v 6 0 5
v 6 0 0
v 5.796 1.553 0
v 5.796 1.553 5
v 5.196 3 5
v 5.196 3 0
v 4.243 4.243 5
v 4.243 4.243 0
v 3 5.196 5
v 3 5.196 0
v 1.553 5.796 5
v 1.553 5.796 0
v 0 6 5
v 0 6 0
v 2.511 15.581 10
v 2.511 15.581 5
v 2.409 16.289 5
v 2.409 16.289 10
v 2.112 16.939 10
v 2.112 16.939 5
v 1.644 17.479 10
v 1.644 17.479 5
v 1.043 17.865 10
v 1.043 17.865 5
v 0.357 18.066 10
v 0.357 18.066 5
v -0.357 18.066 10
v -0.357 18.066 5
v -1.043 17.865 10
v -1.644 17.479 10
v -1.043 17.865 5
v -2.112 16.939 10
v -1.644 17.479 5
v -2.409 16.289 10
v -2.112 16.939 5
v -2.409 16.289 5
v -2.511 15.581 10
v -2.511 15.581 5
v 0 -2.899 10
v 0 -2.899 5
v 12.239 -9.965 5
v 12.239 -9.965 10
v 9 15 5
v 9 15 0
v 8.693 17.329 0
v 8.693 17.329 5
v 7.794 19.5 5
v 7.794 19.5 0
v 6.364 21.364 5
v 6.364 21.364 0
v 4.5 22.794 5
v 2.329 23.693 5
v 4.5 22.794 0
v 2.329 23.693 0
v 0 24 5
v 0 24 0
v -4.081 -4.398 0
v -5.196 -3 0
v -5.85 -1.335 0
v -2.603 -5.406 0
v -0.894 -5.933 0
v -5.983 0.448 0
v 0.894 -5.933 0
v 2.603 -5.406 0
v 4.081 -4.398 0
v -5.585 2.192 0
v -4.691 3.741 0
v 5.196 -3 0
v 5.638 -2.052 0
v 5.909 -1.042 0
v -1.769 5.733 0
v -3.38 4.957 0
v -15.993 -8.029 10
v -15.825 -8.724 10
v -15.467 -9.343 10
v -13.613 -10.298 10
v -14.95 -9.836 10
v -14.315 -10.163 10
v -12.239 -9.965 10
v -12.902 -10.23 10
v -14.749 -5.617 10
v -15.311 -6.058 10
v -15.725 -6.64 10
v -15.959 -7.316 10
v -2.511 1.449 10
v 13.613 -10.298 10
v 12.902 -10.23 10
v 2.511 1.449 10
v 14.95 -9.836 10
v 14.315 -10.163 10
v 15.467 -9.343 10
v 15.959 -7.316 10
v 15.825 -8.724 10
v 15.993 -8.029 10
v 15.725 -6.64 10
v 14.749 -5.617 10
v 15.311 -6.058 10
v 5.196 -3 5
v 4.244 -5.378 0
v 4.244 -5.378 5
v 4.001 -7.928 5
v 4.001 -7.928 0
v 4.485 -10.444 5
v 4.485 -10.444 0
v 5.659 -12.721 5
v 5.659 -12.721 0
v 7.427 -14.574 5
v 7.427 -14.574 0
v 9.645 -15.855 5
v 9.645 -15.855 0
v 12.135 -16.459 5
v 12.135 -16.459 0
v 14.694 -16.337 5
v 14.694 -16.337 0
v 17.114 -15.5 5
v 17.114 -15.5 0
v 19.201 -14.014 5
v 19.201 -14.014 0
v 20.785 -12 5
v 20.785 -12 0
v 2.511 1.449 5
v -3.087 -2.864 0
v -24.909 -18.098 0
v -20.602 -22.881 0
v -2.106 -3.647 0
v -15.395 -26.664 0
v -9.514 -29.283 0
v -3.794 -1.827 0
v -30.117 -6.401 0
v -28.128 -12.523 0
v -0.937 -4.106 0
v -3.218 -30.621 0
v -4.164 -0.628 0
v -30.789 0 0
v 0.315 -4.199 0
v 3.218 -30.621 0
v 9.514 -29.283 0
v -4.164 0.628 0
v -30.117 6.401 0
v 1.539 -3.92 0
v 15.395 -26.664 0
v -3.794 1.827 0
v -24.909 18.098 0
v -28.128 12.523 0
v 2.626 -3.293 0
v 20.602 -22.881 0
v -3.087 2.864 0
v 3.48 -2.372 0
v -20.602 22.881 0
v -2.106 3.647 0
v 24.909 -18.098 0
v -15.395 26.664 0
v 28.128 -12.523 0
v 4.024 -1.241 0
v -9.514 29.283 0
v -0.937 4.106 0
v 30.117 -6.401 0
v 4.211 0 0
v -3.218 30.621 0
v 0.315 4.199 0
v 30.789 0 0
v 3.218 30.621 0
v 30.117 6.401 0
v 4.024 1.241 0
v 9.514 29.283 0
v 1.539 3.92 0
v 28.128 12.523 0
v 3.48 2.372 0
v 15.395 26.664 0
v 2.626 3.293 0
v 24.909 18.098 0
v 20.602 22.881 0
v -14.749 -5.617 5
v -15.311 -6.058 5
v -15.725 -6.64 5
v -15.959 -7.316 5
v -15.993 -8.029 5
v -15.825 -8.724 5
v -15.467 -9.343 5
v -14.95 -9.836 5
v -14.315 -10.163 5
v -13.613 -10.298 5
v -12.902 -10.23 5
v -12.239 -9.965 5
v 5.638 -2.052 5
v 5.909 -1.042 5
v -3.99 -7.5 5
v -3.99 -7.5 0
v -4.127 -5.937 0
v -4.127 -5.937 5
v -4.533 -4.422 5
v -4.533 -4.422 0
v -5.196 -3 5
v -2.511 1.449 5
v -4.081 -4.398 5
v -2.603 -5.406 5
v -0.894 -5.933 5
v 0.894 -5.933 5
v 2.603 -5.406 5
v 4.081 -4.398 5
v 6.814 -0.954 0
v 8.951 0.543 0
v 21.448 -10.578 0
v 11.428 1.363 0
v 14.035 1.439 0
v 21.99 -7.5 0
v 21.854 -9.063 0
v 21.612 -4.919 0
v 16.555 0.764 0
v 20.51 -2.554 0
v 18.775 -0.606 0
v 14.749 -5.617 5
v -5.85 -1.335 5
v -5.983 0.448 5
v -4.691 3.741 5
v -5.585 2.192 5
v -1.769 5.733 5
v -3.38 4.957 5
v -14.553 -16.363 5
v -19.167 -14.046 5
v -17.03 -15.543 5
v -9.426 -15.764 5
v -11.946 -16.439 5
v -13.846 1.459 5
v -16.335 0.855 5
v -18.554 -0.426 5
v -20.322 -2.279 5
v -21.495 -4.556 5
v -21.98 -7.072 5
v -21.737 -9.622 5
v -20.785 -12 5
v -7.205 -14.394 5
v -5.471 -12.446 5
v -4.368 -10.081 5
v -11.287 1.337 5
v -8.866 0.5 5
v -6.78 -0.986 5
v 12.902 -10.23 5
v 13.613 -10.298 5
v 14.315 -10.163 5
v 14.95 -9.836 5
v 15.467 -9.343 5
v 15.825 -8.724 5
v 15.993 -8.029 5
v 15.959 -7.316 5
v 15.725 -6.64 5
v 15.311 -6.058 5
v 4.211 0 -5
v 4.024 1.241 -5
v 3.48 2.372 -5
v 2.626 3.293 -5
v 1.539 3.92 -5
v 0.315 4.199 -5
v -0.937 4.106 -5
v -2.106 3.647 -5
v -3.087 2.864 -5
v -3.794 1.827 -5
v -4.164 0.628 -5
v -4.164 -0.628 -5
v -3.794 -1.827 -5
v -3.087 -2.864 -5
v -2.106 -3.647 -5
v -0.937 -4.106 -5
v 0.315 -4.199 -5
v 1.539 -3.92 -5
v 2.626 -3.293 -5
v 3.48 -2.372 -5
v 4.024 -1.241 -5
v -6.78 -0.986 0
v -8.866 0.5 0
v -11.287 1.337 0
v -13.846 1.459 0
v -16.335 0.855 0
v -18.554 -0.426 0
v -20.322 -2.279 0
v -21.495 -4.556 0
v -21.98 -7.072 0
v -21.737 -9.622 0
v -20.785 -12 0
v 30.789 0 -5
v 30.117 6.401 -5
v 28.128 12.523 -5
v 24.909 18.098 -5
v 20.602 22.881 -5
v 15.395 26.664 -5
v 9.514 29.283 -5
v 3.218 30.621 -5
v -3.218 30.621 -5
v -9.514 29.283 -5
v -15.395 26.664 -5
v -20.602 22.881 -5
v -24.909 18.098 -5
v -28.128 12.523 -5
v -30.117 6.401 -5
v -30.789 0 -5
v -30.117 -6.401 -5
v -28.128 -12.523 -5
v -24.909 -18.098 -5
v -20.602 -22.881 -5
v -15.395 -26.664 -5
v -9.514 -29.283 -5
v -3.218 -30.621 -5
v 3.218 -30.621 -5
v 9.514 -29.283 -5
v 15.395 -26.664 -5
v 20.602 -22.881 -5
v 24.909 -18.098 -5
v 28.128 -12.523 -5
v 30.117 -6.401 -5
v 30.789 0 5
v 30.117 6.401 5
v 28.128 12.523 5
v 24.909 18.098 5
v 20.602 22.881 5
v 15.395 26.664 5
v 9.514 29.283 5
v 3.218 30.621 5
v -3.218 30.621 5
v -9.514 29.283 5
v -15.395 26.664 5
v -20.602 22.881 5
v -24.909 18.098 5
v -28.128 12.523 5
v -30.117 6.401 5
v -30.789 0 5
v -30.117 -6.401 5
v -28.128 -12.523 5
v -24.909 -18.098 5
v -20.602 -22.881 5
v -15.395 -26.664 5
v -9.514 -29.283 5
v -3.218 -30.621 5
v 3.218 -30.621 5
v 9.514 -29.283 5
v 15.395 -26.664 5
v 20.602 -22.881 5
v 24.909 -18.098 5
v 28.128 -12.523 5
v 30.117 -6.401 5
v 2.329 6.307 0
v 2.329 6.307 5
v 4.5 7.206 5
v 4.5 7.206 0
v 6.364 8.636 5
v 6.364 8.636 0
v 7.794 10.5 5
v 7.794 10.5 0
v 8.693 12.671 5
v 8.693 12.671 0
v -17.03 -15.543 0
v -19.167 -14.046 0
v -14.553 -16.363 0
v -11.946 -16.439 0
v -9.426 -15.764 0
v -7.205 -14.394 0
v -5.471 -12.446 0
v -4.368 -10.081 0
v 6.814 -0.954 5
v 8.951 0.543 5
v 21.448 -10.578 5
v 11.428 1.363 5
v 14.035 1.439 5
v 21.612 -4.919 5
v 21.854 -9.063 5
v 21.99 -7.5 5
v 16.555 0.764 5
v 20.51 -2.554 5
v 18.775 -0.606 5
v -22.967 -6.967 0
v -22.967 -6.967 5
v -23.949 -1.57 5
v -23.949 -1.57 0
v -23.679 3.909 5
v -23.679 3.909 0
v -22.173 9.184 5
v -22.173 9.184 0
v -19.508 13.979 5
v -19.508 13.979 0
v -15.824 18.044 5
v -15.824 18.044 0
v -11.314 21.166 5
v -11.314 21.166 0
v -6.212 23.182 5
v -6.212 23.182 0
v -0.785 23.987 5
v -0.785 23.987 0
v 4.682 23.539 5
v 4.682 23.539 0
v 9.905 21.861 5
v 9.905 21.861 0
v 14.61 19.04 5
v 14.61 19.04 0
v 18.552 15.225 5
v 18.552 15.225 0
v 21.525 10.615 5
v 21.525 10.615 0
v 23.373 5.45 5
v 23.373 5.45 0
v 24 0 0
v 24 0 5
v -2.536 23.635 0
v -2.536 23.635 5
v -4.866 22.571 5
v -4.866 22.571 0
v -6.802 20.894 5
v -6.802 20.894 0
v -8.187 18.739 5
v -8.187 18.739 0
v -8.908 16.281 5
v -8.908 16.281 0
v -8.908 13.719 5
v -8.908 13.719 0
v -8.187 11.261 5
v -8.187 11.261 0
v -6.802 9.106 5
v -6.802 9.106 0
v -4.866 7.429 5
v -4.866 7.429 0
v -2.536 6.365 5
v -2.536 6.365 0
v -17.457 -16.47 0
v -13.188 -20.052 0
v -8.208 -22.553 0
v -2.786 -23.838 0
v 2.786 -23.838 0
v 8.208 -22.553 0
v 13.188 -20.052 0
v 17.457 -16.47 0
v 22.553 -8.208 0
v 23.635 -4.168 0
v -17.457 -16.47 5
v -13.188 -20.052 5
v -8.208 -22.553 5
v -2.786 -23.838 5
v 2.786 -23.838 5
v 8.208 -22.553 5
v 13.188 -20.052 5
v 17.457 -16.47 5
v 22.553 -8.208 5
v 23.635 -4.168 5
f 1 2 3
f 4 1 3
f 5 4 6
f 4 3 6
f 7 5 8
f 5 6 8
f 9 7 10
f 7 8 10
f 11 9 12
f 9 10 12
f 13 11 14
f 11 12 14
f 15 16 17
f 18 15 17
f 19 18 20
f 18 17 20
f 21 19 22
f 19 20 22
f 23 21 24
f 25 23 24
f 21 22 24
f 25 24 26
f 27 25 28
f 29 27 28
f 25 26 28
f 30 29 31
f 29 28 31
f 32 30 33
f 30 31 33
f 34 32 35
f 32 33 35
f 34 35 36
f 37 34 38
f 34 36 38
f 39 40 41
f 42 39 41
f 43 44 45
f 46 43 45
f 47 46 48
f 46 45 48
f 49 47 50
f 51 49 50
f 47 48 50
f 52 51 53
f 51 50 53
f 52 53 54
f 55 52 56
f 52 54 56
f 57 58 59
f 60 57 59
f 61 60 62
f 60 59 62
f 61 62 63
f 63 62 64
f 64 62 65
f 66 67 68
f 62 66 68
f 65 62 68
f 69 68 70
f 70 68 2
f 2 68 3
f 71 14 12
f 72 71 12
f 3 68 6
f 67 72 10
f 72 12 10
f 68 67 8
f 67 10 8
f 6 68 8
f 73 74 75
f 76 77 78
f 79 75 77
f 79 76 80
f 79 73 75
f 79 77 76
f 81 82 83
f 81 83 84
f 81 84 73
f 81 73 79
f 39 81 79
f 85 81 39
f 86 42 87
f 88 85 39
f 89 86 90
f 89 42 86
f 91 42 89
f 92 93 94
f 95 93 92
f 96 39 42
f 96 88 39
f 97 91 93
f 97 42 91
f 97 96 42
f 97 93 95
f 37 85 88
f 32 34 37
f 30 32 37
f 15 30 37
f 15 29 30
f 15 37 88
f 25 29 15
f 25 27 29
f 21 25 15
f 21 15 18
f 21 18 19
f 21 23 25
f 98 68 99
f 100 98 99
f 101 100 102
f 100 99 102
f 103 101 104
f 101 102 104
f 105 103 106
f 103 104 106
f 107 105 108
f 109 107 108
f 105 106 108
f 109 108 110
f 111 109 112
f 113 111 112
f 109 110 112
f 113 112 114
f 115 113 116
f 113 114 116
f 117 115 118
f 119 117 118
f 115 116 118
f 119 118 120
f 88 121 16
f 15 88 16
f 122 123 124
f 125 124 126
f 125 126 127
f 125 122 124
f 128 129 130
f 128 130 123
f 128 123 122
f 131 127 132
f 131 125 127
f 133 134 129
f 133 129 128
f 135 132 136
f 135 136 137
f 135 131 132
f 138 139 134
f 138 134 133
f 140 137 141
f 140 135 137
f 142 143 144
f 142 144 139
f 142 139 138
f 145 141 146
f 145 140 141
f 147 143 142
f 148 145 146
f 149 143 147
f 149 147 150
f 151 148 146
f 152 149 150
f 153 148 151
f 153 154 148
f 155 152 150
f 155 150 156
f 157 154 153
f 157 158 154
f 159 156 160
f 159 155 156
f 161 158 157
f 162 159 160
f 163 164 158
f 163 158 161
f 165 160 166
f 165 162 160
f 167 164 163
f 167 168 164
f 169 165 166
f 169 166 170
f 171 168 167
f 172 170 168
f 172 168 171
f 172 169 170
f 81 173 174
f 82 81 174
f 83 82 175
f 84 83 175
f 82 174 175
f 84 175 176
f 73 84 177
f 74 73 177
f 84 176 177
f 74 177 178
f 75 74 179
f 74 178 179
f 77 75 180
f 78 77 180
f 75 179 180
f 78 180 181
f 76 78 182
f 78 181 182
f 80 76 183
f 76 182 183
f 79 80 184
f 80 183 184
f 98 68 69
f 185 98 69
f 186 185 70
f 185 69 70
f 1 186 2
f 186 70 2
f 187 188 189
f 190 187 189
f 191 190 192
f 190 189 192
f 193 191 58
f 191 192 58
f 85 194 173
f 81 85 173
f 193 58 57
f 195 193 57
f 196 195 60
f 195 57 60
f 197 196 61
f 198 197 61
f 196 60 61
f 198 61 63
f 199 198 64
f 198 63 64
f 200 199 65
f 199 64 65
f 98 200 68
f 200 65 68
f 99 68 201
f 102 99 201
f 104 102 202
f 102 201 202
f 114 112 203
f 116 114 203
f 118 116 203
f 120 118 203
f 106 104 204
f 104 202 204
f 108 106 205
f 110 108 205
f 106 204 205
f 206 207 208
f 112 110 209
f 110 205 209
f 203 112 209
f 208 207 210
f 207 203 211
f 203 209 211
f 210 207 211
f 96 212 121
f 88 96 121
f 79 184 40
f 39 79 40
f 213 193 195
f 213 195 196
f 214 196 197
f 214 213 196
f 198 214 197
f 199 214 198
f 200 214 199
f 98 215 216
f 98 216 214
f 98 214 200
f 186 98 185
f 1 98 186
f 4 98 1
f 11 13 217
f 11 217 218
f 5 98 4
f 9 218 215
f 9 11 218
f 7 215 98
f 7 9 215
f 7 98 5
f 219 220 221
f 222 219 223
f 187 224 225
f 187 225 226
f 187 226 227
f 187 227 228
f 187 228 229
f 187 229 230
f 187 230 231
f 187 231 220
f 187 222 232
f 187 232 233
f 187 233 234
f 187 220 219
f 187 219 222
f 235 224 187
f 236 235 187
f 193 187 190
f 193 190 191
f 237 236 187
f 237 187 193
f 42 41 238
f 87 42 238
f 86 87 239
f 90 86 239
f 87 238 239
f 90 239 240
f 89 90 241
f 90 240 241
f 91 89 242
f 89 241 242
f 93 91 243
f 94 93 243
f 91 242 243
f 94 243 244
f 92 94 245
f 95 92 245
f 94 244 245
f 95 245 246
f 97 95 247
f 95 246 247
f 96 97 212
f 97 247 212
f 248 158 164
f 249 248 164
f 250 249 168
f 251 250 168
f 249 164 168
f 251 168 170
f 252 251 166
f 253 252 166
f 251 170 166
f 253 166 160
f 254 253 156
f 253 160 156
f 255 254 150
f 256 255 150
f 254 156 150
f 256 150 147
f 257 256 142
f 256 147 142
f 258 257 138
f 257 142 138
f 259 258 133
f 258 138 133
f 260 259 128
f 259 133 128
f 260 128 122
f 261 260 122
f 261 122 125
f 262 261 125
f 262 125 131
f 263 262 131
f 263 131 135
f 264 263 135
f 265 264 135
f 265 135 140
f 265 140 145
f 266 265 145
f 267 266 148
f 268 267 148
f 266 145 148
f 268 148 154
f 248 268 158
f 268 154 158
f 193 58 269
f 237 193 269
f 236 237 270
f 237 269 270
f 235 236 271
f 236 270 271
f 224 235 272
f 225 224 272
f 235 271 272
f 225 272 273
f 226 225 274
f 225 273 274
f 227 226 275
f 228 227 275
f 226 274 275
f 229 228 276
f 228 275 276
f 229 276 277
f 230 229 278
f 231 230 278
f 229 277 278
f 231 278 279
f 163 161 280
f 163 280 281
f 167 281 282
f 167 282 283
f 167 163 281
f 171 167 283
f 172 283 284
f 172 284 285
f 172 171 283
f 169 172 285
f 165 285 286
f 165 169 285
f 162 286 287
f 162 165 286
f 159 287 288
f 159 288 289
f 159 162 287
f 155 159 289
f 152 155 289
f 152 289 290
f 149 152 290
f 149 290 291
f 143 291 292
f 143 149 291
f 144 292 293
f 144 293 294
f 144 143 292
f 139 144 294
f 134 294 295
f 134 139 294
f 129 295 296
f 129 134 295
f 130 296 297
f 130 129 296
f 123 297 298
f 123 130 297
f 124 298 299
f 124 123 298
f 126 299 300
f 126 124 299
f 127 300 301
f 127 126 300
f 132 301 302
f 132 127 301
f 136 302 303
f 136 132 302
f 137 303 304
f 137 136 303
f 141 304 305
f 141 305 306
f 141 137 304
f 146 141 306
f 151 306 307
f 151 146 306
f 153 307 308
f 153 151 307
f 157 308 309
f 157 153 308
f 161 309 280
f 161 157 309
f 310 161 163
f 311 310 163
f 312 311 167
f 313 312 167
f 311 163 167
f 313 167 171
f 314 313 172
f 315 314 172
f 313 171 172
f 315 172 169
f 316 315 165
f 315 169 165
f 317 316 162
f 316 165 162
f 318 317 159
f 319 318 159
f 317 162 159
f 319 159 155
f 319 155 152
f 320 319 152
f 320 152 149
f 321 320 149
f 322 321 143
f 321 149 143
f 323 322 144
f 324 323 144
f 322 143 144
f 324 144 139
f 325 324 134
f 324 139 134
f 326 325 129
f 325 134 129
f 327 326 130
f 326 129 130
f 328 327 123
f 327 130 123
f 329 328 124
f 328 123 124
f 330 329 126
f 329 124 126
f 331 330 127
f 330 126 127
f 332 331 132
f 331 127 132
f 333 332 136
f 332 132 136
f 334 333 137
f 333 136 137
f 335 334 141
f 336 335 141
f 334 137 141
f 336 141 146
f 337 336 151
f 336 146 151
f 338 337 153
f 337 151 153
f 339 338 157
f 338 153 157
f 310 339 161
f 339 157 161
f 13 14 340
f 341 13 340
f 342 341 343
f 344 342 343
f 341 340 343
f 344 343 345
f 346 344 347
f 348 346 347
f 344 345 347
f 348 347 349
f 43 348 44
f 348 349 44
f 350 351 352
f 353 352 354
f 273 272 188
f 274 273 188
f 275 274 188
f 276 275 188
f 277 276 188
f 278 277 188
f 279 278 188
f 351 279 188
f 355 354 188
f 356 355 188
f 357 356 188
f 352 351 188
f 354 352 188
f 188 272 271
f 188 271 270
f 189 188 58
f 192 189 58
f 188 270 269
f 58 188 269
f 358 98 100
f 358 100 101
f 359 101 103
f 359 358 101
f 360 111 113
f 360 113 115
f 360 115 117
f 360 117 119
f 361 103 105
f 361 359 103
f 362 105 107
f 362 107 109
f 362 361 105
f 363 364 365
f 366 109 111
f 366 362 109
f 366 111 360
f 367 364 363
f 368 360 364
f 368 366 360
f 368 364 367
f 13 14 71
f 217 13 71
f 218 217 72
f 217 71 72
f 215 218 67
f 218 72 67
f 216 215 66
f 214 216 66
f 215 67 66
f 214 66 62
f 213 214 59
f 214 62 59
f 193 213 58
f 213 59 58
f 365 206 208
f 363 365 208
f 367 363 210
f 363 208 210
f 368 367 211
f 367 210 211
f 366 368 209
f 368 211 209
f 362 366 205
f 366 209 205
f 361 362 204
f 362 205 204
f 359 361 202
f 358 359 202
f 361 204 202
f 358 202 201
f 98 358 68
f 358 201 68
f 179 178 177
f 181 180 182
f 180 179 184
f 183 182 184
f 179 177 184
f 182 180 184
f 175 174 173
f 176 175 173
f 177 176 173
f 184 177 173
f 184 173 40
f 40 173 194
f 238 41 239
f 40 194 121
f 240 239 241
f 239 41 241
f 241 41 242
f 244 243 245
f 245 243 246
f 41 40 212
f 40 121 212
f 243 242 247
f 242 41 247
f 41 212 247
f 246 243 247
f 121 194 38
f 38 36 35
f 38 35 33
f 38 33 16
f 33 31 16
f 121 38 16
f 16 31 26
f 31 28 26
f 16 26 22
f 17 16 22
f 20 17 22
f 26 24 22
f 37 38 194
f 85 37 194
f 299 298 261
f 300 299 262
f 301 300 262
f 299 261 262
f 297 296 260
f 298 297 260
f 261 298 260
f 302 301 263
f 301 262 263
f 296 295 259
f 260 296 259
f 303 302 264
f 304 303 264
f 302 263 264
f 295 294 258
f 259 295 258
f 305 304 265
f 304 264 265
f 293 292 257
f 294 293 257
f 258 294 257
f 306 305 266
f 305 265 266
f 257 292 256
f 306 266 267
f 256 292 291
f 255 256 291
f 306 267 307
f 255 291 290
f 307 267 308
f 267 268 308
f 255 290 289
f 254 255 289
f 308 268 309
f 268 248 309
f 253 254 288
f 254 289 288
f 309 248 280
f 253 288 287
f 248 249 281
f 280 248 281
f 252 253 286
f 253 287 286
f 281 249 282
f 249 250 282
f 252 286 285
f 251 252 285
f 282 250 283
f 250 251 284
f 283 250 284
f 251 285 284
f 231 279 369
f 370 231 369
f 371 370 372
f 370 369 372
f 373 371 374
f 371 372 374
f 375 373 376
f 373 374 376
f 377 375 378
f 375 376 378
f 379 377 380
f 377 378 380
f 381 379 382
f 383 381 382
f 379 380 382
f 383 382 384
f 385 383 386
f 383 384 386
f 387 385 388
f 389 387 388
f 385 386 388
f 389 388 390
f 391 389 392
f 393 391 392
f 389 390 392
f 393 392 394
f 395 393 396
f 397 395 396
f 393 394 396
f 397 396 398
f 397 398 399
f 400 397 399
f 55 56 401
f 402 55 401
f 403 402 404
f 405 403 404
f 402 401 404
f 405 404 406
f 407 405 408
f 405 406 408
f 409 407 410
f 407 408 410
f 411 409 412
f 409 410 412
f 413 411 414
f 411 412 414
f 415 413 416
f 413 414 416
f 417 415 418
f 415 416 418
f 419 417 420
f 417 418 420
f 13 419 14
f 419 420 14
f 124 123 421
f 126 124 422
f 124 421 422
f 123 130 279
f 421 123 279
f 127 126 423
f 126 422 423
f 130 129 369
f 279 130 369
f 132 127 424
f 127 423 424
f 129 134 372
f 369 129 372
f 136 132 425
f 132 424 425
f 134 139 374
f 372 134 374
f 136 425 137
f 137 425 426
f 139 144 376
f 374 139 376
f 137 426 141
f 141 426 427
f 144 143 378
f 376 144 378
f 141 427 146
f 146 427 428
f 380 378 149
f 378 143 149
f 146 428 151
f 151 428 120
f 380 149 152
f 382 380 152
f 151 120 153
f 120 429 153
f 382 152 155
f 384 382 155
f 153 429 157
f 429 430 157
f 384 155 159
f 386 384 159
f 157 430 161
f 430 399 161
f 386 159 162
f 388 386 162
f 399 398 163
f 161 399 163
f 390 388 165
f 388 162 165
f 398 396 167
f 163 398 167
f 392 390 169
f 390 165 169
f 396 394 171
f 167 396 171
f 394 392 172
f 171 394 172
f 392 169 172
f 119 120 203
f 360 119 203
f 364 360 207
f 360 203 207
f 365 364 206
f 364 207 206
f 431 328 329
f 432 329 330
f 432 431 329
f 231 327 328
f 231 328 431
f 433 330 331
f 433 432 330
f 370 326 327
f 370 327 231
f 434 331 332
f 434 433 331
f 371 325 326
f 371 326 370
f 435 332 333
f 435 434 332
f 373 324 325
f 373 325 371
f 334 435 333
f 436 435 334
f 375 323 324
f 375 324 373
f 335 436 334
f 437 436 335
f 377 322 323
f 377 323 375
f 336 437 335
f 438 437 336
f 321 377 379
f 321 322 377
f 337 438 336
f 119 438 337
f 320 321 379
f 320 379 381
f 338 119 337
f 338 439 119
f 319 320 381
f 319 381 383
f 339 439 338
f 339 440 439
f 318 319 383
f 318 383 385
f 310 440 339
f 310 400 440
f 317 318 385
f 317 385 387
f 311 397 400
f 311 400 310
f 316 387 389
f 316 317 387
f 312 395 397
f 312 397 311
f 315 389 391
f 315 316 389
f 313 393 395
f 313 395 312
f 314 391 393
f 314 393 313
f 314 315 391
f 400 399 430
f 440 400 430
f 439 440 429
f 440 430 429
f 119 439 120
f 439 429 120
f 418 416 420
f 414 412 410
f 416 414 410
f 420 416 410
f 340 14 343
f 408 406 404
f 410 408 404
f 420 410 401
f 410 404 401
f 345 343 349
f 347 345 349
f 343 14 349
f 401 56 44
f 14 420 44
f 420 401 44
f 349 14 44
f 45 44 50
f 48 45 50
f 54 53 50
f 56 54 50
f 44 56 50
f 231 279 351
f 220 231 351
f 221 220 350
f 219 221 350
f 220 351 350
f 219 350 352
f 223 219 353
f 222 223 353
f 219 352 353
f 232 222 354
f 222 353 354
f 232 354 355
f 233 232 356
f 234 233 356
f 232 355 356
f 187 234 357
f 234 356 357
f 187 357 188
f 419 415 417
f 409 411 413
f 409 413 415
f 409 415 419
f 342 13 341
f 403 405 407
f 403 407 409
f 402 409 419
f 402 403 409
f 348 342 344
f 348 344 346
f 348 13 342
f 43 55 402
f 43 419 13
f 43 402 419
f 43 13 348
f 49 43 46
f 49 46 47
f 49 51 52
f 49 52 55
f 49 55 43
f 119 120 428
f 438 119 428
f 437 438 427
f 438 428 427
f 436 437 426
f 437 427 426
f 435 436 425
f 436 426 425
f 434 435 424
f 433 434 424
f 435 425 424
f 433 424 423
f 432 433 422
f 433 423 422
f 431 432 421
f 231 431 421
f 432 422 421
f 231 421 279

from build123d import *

# Parameters (mm, degrees)
F1_DEPTH = 5
F0_R     = 30.7894498578
F3_DEPTH = 5
F4_R     = 30.7894498578
F4_R_2   = 4.2112716429
F5_DEPTH = 5


with BuildPart() as f1:
    # F0 (on Top) → F1 (new body)
    with BuildSketch(Plane.XY):
        with BuildLine():
            ThreePointArc((0, 24), (-9, 14.9999999913), (1.75e-08, 6))
            ThreePointArc((1.75e-08, 6), (6.3639610369, 8.6360389755), (9, 15))
            ThreePointArc((9, 15), (6.3639610307, 21.3639610307), (0, 24))
        make_face()
    extrude(amount=F1_DEPTH)


with BuildPart() as f1b:
    # F0 (on Top) → F1, piece 2 (new body)
    with BuildSketch(Plane.XY):
        with BuildLine():
            ThreePointArc((5.1961525106, -2.9999998477), (5.7955549805, -1.5529141857), (6, 0))
            ThreePointArc((6, 0), (4.2426406933, 4.2426406809), (1.75e-08, 6))
            ThreePointArc((1.75e-08, 6), (-5.1961524093, 3.0000000232), (-5.1961524408, -2.9999999687))
            ThreePointArc((-5.1961524408, -2.9999999687), (6.99e-08, -6), (5.1961525106, -2.9999998477))
        make_face()
    extrude(amount=F1_DEPTH)


with BuildPart() as f1c:
    # F0 (on Top) → F1, piece 3 (new body)
    with BuildSketch(Plane.XY):
        Circle(F0_R)
        with BuildLine():
            ThreePointArc((-20.7846098286, -11.9999997614), (-20.7846096219, 12.0000001193), (0, 24))
            ThreePointArc((0, 24), (16.9705627485, 16.9705627485), (24, 0))
            ThreePointArc((24, 0), (23.1822198145, -6.2116571438), (20.7846096273, -12.0000001101))
            ThreePointArc((20.7846096273, -12.0000001101), (-2.013e-07, -24), (-20.7846098286, -11.9999997614))
        make_face(mode=Mode.SUBTRACT)
    extrude(amount=F1_DEPTH)


with BuildPart() as f1d:
    # F0 (on Top) → F1, piece 4 (new body)
    with BuildSketch(Plane.XY):
        with BuildLine():
            ThreePointArc((-3.9903810568, -7.5), (-4.2970486248, -5.1706285766), (-5.1961524408, -2.9999999687))
            ThreePointArc((-5.1961524408, -2.9999999687), (-17.4903809531, 0.2942286939), (-20.7846098286, -11.9999997614))
            ThreePointArc((-20.7846098286, -11.9999997614), (-10.6610097839, -16.1933324723), (-3.9903810568, -7.5))
        make_face()
    extrude(amount=F1_DEPTH)


with BuildPart() as f1e:
    # F0 (on Top) → F1, piece 5 (new body)
    with BuildSketch(Plane.XY):
        with BuildLine():
            ThreePointArc((21.9903810568, -7.5), (15.3197525476, 1.1933324138), (5.1961525106, -2.9999998477))
            ThreePointArc((5.1961525106, -2.9999998477), (8.4903809256, -15.2942285583), (20.7846096273, -12.0000001101))
            ThreePointArc((20.7846096273, -12.0000001101), (21.6837134769, -9.8293714673), (21.9903810568, -7.5))
        make_face()
    extrude(amount=F1_DEPTH)


with BuildPart() as f3:
    # F2 (on face) → F3 (new body)
    with BuildSketch(Plane.XY.offset(5)):
        with BuildLine():
            Line((-2.5105387635, 15.5814373866), (-2.5105387635, 1.4494602309))
            Line((-2.5105387635, 1.4494602309), (-14.749189986, -5.6165283469))
            ThreePointArc((-14.749189986, -5.6165283469), (-15.6681109506, -9.045988075), (-12.2386512225, -9.9649090397))
            Line((-12.2386512225, -9.9649090397), (0, -2.8989204618))
            Line((0, -2.8989204618), (12.2386512225, -9.9649090397))
            ThreePointArc((12.2386512225, -9.9649090397), (15.6681109506, -9.045988075), (14.749189986, -5.6165283469))
            Line((14.749189986, -5.6165283469), (2.5105387635, 1.4494602309))
            Line((2.5105387635, 1.4494602309), (2.5105387635, 15.5814373866))
            ThreePointArc((2.5105387635, 15.5814373866), (0, 18.0919761501), (-2.5105387635, 15.5814373866))
        make_face()
    extrude(amount=F3_DEPTH)


with BuildPart() as f5:
    # F4 (on face) → F5 (new body)
    with BuildSketch(Plane.XY):
        Circle(F4_R)
        Circle(F4_R_2, mode=Mode.SUBTRACT)
    extrude(amount=-F5_DEPTH)


solid = Compound([f1.part, f1b.part, f1c.part, f1d.part, f1e.part, f3.part, f5.part])
